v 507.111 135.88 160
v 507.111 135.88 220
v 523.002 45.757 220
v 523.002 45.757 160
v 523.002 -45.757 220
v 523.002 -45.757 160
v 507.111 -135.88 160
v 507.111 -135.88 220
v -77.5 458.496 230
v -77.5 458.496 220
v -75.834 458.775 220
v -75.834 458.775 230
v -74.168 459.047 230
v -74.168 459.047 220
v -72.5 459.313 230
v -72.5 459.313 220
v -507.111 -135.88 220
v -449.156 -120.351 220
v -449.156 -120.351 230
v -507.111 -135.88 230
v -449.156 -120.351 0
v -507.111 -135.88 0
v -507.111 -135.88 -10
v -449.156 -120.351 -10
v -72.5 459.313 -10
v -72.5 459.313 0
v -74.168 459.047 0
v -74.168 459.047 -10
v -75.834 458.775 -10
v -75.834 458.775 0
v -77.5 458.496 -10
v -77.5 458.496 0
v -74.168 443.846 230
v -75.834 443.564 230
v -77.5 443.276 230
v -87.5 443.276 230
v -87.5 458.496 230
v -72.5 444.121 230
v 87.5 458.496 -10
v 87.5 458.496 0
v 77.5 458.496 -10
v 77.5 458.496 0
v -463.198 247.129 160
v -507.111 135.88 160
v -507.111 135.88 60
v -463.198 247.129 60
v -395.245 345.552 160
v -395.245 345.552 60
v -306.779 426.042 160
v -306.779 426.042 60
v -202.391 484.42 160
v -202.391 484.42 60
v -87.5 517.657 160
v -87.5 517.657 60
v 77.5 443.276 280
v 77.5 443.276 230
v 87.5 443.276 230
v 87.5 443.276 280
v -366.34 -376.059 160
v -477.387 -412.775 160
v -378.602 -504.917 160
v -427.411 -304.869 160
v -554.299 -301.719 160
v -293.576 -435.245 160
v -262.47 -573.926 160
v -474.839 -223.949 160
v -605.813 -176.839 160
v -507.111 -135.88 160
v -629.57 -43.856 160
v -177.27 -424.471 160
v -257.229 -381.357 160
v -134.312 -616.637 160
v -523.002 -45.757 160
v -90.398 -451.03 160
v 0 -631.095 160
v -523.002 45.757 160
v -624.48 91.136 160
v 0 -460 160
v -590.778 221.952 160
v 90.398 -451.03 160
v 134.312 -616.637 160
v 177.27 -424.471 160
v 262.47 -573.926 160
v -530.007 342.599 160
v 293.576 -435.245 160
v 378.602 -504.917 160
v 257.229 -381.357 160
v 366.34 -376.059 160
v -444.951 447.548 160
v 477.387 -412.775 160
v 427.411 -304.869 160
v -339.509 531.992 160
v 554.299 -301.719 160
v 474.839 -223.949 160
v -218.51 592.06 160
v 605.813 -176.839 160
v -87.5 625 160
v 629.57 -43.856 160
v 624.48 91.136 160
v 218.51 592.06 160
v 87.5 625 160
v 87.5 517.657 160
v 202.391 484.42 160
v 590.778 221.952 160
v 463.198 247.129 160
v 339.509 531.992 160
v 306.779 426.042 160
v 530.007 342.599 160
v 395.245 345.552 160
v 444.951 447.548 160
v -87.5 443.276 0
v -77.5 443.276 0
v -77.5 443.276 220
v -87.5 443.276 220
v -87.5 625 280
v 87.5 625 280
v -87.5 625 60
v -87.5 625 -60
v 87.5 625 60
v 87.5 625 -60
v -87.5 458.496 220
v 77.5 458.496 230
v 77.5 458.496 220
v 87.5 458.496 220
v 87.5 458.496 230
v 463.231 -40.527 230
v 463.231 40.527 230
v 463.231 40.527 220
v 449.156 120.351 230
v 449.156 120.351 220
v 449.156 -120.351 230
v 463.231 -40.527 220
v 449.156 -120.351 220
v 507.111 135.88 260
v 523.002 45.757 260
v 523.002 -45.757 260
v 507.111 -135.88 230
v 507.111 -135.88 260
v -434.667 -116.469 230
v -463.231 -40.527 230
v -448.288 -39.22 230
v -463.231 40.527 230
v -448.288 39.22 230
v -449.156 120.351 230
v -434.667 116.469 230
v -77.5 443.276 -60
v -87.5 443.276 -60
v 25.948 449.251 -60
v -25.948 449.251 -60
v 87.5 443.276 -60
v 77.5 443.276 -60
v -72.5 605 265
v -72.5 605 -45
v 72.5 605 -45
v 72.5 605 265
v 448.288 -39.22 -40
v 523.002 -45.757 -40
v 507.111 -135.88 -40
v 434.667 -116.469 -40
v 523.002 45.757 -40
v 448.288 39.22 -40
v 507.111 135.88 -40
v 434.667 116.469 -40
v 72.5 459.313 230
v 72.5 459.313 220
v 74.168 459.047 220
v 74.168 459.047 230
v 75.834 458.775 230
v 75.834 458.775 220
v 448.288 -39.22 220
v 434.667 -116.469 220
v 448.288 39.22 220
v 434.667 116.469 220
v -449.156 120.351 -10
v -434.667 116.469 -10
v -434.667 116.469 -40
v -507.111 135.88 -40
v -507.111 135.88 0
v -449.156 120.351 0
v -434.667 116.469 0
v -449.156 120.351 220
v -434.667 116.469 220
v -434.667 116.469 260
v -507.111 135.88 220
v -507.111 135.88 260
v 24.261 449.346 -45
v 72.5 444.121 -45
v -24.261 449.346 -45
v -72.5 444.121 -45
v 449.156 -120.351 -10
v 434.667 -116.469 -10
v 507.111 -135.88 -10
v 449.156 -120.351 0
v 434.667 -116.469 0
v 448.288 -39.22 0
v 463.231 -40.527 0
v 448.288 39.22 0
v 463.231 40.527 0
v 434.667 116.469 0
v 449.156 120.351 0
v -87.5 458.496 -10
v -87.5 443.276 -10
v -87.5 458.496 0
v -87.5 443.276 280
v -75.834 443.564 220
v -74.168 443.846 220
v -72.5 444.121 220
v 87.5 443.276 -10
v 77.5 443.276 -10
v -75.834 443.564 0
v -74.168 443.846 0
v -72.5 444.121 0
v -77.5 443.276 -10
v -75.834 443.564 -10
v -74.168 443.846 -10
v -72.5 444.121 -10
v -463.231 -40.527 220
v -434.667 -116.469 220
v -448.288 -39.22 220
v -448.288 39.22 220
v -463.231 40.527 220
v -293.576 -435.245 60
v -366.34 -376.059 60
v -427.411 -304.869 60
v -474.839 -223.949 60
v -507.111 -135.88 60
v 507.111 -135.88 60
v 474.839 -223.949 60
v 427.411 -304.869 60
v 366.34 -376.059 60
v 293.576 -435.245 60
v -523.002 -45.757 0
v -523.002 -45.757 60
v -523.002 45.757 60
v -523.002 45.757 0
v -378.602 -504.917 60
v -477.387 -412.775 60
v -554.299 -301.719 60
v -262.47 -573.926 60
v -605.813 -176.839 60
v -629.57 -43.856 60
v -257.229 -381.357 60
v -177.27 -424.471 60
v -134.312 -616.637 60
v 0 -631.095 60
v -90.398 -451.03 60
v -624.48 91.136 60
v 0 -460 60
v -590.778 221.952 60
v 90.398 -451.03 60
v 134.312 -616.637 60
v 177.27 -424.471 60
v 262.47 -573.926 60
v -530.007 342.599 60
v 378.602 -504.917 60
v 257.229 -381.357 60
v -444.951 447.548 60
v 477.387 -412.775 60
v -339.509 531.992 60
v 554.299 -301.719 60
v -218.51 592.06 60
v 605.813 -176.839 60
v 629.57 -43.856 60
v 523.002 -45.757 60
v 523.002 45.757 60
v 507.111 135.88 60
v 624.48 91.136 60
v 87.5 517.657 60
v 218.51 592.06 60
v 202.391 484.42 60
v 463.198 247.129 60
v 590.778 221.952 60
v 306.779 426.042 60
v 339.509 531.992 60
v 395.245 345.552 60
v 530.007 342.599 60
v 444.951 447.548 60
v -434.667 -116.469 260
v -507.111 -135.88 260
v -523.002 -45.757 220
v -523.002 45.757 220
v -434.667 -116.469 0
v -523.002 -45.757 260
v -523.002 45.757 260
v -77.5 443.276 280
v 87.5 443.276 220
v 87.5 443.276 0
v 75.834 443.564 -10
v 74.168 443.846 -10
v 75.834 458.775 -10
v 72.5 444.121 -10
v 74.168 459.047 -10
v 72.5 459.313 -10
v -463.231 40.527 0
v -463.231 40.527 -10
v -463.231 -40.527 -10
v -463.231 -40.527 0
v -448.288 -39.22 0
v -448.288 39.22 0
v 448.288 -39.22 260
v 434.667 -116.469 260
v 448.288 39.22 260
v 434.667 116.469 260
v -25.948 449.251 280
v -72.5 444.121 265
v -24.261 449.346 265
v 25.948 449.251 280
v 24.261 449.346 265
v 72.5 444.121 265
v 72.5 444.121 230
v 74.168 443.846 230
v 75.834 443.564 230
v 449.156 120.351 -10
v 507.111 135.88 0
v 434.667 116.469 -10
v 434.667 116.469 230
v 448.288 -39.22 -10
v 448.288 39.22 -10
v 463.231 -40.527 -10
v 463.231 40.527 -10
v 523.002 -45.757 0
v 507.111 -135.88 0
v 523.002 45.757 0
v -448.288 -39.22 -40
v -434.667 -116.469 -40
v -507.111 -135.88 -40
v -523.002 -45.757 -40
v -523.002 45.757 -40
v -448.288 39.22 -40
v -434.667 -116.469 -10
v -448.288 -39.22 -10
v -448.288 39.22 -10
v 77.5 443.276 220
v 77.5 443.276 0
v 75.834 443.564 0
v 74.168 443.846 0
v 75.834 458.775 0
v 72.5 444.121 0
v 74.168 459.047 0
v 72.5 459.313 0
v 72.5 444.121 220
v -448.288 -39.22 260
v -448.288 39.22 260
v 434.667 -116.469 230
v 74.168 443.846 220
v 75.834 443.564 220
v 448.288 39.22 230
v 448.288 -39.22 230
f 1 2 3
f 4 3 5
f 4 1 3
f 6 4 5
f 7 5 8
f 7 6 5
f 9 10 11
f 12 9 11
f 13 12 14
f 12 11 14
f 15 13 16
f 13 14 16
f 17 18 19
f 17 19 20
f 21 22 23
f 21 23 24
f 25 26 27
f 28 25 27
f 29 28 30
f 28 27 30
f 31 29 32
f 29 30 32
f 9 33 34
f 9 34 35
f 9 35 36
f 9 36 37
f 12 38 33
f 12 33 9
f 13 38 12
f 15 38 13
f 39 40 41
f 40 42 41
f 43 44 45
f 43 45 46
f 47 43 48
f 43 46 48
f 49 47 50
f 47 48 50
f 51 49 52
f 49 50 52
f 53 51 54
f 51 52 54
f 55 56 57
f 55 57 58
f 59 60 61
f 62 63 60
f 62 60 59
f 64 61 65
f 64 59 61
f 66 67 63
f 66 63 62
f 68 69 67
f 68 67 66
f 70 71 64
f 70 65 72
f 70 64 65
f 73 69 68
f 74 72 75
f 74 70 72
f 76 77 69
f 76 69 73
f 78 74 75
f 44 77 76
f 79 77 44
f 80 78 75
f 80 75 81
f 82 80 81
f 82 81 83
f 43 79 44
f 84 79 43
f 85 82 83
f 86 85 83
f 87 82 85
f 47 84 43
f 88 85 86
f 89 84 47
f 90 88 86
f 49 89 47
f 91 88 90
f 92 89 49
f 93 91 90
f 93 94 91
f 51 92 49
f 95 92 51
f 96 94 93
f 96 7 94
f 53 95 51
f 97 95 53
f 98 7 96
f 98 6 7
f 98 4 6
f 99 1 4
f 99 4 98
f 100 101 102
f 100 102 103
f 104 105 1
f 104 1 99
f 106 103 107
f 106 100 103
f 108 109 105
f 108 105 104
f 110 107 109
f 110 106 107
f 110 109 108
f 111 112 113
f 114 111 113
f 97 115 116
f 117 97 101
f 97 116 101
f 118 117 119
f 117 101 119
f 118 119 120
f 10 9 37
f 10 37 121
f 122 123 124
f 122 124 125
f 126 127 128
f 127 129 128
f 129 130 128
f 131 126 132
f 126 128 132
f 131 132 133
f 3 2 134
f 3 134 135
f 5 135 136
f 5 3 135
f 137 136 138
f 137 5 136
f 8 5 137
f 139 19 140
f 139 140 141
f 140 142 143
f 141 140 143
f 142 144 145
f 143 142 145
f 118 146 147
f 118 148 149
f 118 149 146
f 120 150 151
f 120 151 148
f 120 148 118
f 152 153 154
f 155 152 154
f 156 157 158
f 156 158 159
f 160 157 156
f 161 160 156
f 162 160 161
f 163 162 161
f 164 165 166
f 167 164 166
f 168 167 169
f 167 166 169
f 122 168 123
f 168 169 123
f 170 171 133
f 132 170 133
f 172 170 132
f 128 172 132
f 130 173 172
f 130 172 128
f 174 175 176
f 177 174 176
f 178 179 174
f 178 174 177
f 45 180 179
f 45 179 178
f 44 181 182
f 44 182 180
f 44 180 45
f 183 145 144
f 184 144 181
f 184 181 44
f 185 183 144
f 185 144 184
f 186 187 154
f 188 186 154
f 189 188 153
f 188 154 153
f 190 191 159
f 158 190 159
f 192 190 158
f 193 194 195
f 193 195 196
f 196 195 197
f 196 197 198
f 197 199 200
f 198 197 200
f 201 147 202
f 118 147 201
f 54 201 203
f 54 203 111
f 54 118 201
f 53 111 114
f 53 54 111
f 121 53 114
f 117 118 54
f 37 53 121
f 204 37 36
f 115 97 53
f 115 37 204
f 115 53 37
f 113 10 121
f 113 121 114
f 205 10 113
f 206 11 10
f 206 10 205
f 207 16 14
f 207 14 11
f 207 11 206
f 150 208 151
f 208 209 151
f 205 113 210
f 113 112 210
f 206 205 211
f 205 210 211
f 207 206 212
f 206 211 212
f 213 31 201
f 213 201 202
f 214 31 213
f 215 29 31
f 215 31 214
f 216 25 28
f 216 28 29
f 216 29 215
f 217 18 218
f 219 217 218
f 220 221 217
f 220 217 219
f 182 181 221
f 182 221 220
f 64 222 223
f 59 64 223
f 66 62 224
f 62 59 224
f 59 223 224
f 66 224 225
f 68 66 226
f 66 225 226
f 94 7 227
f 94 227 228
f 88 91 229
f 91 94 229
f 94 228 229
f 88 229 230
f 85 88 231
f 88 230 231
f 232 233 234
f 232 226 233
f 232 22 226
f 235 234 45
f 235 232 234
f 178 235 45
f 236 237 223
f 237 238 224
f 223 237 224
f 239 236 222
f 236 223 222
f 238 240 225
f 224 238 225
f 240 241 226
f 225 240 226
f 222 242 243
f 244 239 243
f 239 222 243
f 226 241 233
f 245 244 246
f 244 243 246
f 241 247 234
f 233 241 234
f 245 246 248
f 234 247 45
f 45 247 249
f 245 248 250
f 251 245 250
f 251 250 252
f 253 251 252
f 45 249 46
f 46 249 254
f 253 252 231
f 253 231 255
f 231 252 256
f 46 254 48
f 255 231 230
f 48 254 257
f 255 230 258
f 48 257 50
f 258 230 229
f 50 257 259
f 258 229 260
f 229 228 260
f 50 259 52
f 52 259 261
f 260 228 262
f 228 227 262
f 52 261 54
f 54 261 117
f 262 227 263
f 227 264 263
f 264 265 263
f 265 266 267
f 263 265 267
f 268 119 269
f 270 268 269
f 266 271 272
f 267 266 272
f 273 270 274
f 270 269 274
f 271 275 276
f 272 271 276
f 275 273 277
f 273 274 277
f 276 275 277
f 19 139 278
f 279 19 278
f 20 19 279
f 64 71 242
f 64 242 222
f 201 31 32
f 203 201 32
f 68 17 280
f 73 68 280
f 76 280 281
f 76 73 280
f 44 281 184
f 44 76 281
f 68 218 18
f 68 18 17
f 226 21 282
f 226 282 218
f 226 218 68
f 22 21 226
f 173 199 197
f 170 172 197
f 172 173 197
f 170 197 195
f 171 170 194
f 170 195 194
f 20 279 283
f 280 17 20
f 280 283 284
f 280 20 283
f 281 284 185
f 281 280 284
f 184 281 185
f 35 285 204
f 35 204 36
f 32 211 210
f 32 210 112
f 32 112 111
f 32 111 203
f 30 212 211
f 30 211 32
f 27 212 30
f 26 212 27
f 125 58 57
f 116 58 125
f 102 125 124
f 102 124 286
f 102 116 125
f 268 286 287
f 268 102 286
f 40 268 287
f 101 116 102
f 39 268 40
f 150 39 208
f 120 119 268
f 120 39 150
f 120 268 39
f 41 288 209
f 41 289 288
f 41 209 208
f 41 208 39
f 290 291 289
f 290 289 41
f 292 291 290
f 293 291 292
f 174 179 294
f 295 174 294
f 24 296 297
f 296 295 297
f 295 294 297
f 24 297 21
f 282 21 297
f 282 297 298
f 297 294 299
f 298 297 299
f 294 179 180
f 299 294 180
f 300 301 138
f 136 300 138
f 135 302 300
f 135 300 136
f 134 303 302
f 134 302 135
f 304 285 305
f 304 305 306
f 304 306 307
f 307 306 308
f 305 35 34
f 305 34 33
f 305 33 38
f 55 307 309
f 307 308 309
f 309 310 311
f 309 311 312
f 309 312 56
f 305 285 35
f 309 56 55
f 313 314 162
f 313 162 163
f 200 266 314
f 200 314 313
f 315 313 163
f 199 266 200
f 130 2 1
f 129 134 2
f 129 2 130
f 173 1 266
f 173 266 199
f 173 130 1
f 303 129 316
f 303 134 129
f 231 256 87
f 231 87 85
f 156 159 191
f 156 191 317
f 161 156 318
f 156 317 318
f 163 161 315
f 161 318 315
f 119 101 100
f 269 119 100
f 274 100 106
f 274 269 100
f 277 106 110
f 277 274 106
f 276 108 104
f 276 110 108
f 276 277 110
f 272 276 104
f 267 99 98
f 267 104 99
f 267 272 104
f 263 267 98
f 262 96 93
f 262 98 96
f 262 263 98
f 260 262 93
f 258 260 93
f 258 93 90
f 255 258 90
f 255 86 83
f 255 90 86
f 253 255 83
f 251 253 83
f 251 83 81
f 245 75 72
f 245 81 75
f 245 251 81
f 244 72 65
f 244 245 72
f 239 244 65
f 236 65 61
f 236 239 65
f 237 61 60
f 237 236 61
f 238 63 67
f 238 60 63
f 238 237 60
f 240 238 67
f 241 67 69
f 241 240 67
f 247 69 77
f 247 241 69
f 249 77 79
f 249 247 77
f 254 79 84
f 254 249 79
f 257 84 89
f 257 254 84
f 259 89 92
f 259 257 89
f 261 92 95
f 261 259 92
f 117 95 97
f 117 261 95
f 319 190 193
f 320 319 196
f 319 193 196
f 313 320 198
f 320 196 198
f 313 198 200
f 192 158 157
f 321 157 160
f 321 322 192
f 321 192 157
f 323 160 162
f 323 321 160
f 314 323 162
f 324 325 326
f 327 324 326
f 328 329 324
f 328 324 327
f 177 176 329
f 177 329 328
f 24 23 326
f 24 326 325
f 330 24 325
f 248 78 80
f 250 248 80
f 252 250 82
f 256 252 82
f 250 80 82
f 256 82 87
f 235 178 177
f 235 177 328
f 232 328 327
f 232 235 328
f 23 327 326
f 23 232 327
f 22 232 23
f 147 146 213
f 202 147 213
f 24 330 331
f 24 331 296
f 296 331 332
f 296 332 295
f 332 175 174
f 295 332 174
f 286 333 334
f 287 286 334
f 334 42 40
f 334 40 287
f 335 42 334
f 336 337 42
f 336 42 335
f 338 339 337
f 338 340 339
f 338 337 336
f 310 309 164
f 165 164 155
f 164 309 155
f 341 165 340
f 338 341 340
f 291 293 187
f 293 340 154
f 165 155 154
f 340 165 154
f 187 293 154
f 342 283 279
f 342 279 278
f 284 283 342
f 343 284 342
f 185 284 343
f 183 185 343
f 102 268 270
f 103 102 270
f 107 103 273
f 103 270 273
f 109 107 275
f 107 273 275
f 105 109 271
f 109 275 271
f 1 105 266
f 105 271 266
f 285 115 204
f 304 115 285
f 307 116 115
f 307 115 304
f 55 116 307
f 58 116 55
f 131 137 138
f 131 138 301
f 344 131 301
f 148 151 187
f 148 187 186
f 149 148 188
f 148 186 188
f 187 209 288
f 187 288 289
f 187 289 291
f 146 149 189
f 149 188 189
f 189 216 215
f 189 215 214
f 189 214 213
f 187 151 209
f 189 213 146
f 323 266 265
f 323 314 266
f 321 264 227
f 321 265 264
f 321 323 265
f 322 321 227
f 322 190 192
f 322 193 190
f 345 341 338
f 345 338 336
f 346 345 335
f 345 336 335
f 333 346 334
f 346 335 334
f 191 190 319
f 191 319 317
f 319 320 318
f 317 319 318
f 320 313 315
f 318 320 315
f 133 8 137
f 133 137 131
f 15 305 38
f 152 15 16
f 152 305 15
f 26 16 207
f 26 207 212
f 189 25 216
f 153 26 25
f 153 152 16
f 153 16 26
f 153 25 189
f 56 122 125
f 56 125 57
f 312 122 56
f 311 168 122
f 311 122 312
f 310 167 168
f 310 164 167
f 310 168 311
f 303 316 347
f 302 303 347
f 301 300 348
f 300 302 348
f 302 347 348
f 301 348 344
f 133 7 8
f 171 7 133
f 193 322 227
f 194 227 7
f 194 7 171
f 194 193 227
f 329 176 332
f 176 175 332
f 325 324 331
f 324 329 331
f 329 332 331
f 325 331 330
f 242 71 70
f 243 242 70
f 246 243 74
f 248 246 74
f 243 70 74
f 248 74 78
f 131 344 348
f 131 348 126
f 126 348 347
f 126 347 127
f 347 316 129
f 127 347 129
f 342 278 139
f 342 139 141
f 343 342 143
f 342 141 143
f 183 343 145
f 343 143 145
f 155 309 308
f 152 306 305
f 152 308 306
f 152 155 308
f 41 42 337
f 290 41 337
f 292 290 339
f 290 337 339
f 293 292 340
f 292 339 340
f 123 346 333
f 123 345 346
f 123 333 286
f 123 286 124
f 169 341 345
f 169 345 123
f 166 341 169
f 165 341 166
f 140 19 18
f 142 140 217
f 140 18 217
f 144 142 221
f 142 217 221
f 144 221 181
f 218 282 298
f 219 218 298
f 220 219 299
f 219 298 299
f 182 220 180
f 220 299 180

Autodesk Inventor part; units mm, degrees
sketch "Sketch1" plane through (0, 0, 0) normal (0, 0, 1) x (1, 0, 0)
  line L0 (0, 450) -> (0, 610) construction
  line L1 (-77.5, 610) -> (-77.5, 443.2762)
  line L2 (77.5, 610) -> (77.5, 443.2762)
  arc A0 (77.5, 443.2762) -> (-77.5, 443.2762) centre (0, 0) ccw
  line L3 (-77.5, 610) -> (-77.5, 625)
  line L4 (-77.5, 625) -> (77.5, 625)
  line L5 (77.5, 625) -> (77.5, 610)
  dimension "d7" = 15
extrude "Extrusion1" add sketch "Sketch1" along normal blind 220
sketch "Sketch2" plane through (0, 0, 220) normal (0, 0, 1) x (1, 0, 0)
  arc A0 (77.5, 443.2762) -> (-77.5, 443.2762) centre (0, 0) ccw projected
  line L0 (77.5, 443.2762) -> (77.5, 625) projected
  line L1 (77.5, 458.4962) -> (77.5, 625)
  line L2 (77.5, 625) -> (-77.5, 625)
  line L3 (-77.5, 625) -> (-77.5, 458.4962)
  arc A1 (77.5, 458.4962) -> (-77.5012, 458.496) centre (0, 0) ccw
  dimension "d12" = 465
extrude "Extrusion2" add sketch "Sketch2" along normal blind 10
sketch "Sketch3" plane through (0, 0, 230) normal (0, 0, 1) x (1, 0, 0)
  arc A0 (77.5, 443.2762) -> (-77.5, 443.2762) centre (0, 0) ccw projected
  arc A1 (77.5, 443.2762) -> (-77.5, 443.2762) centre (0, 0) ccw
  line L0 (-77.5, 625) -> (-77.5, 443.2762) projected
  line L1 (-77.5, 443.2762) -> (-77.5, 625)
  line L2 (-77.5, 625) -> (77.5, 625)
  line L3 (77.5, 625) -> (77.5, 443.2762)
extrude "Extrusion3" add sketch "Sketch3" along normal blind 50
ref_plane "Work Plane1" through (0, 0, 110) normal (0, 0, 1) x (1, 0, 0)
mirror "Mirror1" about plane through (0, 0, 110) normal (0, 0, 1) of "Extrusion2", "Extrusion3"
ref_plane "Work Plane2" through (-77.5, 605, 280) normal (0, 1, 0) x (1, 0, 0)
sketch "Sketch4" plane through (-77.5, 605, 280) normal (0, 1, 0) x (1, 0, 0)
  line L0 (5, 15) -> (5, 325)
  line L1 (150, 15) -> (150, 325)
  line L2 (155, 340) -> (155, 0) projected
  line L3 (150, 15) -> (5, 15)
  line L4 (150, 325) -> (5, 325)
  point P0 (77.5, 280)
extrude "Extrusion4" cut sketch "Sketch4" against normal up to next
sketch "Sketch5" plane through (77.5, 443.2762, 220) normal (1, 0, 0) x (0, 0, -1)
  line L0 (280, 181.7238) -> (-60, 181.7238) projected
  line L1 (-60, 181.7238) -> (280, 181.7238)
  line L2 (-10, 0) -> (-60, 0) projected
  line L3 (-60, 0) -> (-60, 181.7238)
  line L4 (230, 0) -> (280, 0) projected
  line L5 (280, 181.7238) -> (280, 0) projected
  line L6 (280, 0) -> (280, 181.7238)
  line L7 (230, 0) -> (280, 0)
  line L8 (220, 15.22) -> (230, 15.22) projected
  line L9 (230, 0) -> (230, 15.22)
  line L10 (230, 15.22) -> (220, 15.22)
  line L11 (220, 15.22) -> (220, 0)
  line L12 (0, 16.0372) -> (0, 15.22) projected
  line L13 (0, 0) -> (0, 15.22)
  line L14 (0, 15.22) -> (-10, 15.22) projected
  line L15 (0, 15.22) -> (-10, 15.22)
  line L16 (-10, 15.22) -> (-10, 0)
  line L17 (-60, 0) -> (-10, 0)
  line L18 (0, 0) -> (220, 0)
  point P0 (220, -443.2762)
extrude "Extrusion5" add sketch "Sketch5" along normal blind 10
mirror "Mirror2" about plane through (0, 0, 0) normal (1, 0, 0) of "Extrusion5"
ref_plane "Work Plane4" through (0, 0, 110) normal (0, 0, 1) x (1, 0, 0)
sketch "Sketch7" plane through (0, 0, 110) normal (0, 0, 1) x (1, 0, 0)
  line L0 (87.5, 625) -> (87.5, 443.2762) projected
  arc A0 (-87.5, 625) -> (87.5, 625) centre (0, 0) ccw
  arc A1 (-87.5, 517.657) -> (87.5, 517.657) centre (0, 0) ccw
  line L1 (87.5, 517.657) -> (87.5, 625)
  line L2 (-87.5, 625) -> (-87.5, 517.657)
  dimension "d20" = 1050
extrude "Extrusion6" add sketch "Sketch7" along normal mid plane 100
sketch "Sketch8" plane through (0, 0, 160) normal (0, 0, 1) x (1, 0, 0)
  line L0 (0, 0) -> (-251.6368, -373.0669) construction
  line L1 (0, 0) -> (0, -450) construction
  line L2 (0, 0) -> (251.6368, -373.0669) construction
  line L3 (0, 0) -> (0, -450) construction
  line L4 (257.2287, -381.3573) -> (293.5763, -435.2447)
  arc A0 (-87.5, 517.657) -> (87.5, 517.657) centre (0, 0) ccw projected
  line L5 (-257.2287, -381.3573) -> (-293.5763, -435.2447)
  arc A1 (-293.5763, -435.2447) -> (293.5763, -435.2447) centre (0, 0) ccw
  arc A2 (0, -460) -> (257.2287, -381.3573) centre (0, 0) ccw
  arc A3 (-257.2287, -381.3573) -> (0, -460) centre (0, 0) ccw
  dimension "d24" = 34
  dimension "d25" = 34
  dimension "d28" = 450
  dimension "d29" = 460
extrude "Extrusion7" add sketch "Sketch8" against normal blind 100
sketch "Sketch9" plane through (0, 0, 110) normal (0, 0, 1) x (1, 0, 0)
  arc A0 (293.5763, -435.2447) -> (87.5, 517.657) centre (0, 0) ccw projected
  arc A1 (507.1111, -135.88) -> (507.1111, 135.88) centre (0, 0) ccw
  line L0 (0, 0) -> (507.1111, 135.88) construction
  line L1 (0, 0) -> (525, 0) construction
  line L2 (0, 0) -> (507.1111, -135.88) construction
  arc A2 (434.6666, -116.4686) -> (434.6666, 116.4686) centre (0, 0) ccw
  line L3 (0, 0) -> (434.6666, 116.4686) construction
  line L4 (0, 0) -> (450, 0) construction
  line L5 (0, 0) -> (434.6666, -116.4686) construction
  line L6 (434.6666, 116.4686) -> (507.1111, 135.88)
  line L7 (507.1111, -135.88) -> (434.6666, -116.4686)
  dimension "d30" = 15
  dimension "d31" = 30
  dimension "d32" = 450
  dimension "d33" = 15
  dimension "d34" = 30
extrude "Extrusion8" add sketch "Sketch9" along normal mid plane 220
sketch "Sketch10" plane through (0, 0, 220) normal (0, 0, 1) x (1, 0, 0)
  line L0 (507.1111, 135.88) -> (434.6666, 116.4686) projected
  arc A0 (449.1555, -120.3509) -> (449.1555, 120.3509) centre (0, 0) ccw
  arc A1 (507.1111, -135.88) -> (507.1111, 135.88) centre (0, 0) ccw projected
  arc A2 (507.1111, -135.88) -> (507.1111, 135.88) centre (0, 0) ccw
  line L1 (449.1555, 120.3509) -> (507.1111, 135.88)
  line L2 (507.1111, -135.88) -> (449.1555, -120.3509)
  dimension "d37" = 465
extrude "Extrusion9" add sketch "Sketch10" along normal blind 10
sketch "Sketch11" plane through (0, 0, 230) normal (0, 0, 1) x (1, 0, 0)
  arc A0 (434.6666, -116.4686) -> (434.6666, 116.4686) centre (0, 0) ccw projected
  line L0 (434.6666, 116.4686) -> (507.1111, 135.88) projected
  arc A1 (434.6666, -116.4686) -> (434.6666, 116.4686) centre (0, 0) ccw
  arc A2 (507.1111, -135.88) -> (507.1111, 135.88) centre (0, 0) ccw projected
  arc A3 (507.1111, -135.88) -> (507.1111, 135.88) centre (0, 0) ccw
  line L1 (507.1111, 135.88) -> (434.6666, 116.4686)
  line L2 (507.1111, -135.88) -> (434.6666, -116.4686) projected
  line L3 (507.1111, -135.88) -> (434.6666, -116.4686)
extrude "Extrusion10" add sketch "Sketch11" along normal blind 30
mirror "Mirror3" about plane through (0, 0, 110) normal (0, 0, 1) of "Extrusion9", "Extrusion10"
mirror "Mirror4" about plane through (0, 0, 0) normal (1, 0, 0) of "Extrusion8", "Extrusion9", "Extrusion10", "Mirror3"
ref_plane "Work Plane3" through (0, 0, 0) normal (1, 0, 0) x (0, 1, 0)
properties part number "source holder"
